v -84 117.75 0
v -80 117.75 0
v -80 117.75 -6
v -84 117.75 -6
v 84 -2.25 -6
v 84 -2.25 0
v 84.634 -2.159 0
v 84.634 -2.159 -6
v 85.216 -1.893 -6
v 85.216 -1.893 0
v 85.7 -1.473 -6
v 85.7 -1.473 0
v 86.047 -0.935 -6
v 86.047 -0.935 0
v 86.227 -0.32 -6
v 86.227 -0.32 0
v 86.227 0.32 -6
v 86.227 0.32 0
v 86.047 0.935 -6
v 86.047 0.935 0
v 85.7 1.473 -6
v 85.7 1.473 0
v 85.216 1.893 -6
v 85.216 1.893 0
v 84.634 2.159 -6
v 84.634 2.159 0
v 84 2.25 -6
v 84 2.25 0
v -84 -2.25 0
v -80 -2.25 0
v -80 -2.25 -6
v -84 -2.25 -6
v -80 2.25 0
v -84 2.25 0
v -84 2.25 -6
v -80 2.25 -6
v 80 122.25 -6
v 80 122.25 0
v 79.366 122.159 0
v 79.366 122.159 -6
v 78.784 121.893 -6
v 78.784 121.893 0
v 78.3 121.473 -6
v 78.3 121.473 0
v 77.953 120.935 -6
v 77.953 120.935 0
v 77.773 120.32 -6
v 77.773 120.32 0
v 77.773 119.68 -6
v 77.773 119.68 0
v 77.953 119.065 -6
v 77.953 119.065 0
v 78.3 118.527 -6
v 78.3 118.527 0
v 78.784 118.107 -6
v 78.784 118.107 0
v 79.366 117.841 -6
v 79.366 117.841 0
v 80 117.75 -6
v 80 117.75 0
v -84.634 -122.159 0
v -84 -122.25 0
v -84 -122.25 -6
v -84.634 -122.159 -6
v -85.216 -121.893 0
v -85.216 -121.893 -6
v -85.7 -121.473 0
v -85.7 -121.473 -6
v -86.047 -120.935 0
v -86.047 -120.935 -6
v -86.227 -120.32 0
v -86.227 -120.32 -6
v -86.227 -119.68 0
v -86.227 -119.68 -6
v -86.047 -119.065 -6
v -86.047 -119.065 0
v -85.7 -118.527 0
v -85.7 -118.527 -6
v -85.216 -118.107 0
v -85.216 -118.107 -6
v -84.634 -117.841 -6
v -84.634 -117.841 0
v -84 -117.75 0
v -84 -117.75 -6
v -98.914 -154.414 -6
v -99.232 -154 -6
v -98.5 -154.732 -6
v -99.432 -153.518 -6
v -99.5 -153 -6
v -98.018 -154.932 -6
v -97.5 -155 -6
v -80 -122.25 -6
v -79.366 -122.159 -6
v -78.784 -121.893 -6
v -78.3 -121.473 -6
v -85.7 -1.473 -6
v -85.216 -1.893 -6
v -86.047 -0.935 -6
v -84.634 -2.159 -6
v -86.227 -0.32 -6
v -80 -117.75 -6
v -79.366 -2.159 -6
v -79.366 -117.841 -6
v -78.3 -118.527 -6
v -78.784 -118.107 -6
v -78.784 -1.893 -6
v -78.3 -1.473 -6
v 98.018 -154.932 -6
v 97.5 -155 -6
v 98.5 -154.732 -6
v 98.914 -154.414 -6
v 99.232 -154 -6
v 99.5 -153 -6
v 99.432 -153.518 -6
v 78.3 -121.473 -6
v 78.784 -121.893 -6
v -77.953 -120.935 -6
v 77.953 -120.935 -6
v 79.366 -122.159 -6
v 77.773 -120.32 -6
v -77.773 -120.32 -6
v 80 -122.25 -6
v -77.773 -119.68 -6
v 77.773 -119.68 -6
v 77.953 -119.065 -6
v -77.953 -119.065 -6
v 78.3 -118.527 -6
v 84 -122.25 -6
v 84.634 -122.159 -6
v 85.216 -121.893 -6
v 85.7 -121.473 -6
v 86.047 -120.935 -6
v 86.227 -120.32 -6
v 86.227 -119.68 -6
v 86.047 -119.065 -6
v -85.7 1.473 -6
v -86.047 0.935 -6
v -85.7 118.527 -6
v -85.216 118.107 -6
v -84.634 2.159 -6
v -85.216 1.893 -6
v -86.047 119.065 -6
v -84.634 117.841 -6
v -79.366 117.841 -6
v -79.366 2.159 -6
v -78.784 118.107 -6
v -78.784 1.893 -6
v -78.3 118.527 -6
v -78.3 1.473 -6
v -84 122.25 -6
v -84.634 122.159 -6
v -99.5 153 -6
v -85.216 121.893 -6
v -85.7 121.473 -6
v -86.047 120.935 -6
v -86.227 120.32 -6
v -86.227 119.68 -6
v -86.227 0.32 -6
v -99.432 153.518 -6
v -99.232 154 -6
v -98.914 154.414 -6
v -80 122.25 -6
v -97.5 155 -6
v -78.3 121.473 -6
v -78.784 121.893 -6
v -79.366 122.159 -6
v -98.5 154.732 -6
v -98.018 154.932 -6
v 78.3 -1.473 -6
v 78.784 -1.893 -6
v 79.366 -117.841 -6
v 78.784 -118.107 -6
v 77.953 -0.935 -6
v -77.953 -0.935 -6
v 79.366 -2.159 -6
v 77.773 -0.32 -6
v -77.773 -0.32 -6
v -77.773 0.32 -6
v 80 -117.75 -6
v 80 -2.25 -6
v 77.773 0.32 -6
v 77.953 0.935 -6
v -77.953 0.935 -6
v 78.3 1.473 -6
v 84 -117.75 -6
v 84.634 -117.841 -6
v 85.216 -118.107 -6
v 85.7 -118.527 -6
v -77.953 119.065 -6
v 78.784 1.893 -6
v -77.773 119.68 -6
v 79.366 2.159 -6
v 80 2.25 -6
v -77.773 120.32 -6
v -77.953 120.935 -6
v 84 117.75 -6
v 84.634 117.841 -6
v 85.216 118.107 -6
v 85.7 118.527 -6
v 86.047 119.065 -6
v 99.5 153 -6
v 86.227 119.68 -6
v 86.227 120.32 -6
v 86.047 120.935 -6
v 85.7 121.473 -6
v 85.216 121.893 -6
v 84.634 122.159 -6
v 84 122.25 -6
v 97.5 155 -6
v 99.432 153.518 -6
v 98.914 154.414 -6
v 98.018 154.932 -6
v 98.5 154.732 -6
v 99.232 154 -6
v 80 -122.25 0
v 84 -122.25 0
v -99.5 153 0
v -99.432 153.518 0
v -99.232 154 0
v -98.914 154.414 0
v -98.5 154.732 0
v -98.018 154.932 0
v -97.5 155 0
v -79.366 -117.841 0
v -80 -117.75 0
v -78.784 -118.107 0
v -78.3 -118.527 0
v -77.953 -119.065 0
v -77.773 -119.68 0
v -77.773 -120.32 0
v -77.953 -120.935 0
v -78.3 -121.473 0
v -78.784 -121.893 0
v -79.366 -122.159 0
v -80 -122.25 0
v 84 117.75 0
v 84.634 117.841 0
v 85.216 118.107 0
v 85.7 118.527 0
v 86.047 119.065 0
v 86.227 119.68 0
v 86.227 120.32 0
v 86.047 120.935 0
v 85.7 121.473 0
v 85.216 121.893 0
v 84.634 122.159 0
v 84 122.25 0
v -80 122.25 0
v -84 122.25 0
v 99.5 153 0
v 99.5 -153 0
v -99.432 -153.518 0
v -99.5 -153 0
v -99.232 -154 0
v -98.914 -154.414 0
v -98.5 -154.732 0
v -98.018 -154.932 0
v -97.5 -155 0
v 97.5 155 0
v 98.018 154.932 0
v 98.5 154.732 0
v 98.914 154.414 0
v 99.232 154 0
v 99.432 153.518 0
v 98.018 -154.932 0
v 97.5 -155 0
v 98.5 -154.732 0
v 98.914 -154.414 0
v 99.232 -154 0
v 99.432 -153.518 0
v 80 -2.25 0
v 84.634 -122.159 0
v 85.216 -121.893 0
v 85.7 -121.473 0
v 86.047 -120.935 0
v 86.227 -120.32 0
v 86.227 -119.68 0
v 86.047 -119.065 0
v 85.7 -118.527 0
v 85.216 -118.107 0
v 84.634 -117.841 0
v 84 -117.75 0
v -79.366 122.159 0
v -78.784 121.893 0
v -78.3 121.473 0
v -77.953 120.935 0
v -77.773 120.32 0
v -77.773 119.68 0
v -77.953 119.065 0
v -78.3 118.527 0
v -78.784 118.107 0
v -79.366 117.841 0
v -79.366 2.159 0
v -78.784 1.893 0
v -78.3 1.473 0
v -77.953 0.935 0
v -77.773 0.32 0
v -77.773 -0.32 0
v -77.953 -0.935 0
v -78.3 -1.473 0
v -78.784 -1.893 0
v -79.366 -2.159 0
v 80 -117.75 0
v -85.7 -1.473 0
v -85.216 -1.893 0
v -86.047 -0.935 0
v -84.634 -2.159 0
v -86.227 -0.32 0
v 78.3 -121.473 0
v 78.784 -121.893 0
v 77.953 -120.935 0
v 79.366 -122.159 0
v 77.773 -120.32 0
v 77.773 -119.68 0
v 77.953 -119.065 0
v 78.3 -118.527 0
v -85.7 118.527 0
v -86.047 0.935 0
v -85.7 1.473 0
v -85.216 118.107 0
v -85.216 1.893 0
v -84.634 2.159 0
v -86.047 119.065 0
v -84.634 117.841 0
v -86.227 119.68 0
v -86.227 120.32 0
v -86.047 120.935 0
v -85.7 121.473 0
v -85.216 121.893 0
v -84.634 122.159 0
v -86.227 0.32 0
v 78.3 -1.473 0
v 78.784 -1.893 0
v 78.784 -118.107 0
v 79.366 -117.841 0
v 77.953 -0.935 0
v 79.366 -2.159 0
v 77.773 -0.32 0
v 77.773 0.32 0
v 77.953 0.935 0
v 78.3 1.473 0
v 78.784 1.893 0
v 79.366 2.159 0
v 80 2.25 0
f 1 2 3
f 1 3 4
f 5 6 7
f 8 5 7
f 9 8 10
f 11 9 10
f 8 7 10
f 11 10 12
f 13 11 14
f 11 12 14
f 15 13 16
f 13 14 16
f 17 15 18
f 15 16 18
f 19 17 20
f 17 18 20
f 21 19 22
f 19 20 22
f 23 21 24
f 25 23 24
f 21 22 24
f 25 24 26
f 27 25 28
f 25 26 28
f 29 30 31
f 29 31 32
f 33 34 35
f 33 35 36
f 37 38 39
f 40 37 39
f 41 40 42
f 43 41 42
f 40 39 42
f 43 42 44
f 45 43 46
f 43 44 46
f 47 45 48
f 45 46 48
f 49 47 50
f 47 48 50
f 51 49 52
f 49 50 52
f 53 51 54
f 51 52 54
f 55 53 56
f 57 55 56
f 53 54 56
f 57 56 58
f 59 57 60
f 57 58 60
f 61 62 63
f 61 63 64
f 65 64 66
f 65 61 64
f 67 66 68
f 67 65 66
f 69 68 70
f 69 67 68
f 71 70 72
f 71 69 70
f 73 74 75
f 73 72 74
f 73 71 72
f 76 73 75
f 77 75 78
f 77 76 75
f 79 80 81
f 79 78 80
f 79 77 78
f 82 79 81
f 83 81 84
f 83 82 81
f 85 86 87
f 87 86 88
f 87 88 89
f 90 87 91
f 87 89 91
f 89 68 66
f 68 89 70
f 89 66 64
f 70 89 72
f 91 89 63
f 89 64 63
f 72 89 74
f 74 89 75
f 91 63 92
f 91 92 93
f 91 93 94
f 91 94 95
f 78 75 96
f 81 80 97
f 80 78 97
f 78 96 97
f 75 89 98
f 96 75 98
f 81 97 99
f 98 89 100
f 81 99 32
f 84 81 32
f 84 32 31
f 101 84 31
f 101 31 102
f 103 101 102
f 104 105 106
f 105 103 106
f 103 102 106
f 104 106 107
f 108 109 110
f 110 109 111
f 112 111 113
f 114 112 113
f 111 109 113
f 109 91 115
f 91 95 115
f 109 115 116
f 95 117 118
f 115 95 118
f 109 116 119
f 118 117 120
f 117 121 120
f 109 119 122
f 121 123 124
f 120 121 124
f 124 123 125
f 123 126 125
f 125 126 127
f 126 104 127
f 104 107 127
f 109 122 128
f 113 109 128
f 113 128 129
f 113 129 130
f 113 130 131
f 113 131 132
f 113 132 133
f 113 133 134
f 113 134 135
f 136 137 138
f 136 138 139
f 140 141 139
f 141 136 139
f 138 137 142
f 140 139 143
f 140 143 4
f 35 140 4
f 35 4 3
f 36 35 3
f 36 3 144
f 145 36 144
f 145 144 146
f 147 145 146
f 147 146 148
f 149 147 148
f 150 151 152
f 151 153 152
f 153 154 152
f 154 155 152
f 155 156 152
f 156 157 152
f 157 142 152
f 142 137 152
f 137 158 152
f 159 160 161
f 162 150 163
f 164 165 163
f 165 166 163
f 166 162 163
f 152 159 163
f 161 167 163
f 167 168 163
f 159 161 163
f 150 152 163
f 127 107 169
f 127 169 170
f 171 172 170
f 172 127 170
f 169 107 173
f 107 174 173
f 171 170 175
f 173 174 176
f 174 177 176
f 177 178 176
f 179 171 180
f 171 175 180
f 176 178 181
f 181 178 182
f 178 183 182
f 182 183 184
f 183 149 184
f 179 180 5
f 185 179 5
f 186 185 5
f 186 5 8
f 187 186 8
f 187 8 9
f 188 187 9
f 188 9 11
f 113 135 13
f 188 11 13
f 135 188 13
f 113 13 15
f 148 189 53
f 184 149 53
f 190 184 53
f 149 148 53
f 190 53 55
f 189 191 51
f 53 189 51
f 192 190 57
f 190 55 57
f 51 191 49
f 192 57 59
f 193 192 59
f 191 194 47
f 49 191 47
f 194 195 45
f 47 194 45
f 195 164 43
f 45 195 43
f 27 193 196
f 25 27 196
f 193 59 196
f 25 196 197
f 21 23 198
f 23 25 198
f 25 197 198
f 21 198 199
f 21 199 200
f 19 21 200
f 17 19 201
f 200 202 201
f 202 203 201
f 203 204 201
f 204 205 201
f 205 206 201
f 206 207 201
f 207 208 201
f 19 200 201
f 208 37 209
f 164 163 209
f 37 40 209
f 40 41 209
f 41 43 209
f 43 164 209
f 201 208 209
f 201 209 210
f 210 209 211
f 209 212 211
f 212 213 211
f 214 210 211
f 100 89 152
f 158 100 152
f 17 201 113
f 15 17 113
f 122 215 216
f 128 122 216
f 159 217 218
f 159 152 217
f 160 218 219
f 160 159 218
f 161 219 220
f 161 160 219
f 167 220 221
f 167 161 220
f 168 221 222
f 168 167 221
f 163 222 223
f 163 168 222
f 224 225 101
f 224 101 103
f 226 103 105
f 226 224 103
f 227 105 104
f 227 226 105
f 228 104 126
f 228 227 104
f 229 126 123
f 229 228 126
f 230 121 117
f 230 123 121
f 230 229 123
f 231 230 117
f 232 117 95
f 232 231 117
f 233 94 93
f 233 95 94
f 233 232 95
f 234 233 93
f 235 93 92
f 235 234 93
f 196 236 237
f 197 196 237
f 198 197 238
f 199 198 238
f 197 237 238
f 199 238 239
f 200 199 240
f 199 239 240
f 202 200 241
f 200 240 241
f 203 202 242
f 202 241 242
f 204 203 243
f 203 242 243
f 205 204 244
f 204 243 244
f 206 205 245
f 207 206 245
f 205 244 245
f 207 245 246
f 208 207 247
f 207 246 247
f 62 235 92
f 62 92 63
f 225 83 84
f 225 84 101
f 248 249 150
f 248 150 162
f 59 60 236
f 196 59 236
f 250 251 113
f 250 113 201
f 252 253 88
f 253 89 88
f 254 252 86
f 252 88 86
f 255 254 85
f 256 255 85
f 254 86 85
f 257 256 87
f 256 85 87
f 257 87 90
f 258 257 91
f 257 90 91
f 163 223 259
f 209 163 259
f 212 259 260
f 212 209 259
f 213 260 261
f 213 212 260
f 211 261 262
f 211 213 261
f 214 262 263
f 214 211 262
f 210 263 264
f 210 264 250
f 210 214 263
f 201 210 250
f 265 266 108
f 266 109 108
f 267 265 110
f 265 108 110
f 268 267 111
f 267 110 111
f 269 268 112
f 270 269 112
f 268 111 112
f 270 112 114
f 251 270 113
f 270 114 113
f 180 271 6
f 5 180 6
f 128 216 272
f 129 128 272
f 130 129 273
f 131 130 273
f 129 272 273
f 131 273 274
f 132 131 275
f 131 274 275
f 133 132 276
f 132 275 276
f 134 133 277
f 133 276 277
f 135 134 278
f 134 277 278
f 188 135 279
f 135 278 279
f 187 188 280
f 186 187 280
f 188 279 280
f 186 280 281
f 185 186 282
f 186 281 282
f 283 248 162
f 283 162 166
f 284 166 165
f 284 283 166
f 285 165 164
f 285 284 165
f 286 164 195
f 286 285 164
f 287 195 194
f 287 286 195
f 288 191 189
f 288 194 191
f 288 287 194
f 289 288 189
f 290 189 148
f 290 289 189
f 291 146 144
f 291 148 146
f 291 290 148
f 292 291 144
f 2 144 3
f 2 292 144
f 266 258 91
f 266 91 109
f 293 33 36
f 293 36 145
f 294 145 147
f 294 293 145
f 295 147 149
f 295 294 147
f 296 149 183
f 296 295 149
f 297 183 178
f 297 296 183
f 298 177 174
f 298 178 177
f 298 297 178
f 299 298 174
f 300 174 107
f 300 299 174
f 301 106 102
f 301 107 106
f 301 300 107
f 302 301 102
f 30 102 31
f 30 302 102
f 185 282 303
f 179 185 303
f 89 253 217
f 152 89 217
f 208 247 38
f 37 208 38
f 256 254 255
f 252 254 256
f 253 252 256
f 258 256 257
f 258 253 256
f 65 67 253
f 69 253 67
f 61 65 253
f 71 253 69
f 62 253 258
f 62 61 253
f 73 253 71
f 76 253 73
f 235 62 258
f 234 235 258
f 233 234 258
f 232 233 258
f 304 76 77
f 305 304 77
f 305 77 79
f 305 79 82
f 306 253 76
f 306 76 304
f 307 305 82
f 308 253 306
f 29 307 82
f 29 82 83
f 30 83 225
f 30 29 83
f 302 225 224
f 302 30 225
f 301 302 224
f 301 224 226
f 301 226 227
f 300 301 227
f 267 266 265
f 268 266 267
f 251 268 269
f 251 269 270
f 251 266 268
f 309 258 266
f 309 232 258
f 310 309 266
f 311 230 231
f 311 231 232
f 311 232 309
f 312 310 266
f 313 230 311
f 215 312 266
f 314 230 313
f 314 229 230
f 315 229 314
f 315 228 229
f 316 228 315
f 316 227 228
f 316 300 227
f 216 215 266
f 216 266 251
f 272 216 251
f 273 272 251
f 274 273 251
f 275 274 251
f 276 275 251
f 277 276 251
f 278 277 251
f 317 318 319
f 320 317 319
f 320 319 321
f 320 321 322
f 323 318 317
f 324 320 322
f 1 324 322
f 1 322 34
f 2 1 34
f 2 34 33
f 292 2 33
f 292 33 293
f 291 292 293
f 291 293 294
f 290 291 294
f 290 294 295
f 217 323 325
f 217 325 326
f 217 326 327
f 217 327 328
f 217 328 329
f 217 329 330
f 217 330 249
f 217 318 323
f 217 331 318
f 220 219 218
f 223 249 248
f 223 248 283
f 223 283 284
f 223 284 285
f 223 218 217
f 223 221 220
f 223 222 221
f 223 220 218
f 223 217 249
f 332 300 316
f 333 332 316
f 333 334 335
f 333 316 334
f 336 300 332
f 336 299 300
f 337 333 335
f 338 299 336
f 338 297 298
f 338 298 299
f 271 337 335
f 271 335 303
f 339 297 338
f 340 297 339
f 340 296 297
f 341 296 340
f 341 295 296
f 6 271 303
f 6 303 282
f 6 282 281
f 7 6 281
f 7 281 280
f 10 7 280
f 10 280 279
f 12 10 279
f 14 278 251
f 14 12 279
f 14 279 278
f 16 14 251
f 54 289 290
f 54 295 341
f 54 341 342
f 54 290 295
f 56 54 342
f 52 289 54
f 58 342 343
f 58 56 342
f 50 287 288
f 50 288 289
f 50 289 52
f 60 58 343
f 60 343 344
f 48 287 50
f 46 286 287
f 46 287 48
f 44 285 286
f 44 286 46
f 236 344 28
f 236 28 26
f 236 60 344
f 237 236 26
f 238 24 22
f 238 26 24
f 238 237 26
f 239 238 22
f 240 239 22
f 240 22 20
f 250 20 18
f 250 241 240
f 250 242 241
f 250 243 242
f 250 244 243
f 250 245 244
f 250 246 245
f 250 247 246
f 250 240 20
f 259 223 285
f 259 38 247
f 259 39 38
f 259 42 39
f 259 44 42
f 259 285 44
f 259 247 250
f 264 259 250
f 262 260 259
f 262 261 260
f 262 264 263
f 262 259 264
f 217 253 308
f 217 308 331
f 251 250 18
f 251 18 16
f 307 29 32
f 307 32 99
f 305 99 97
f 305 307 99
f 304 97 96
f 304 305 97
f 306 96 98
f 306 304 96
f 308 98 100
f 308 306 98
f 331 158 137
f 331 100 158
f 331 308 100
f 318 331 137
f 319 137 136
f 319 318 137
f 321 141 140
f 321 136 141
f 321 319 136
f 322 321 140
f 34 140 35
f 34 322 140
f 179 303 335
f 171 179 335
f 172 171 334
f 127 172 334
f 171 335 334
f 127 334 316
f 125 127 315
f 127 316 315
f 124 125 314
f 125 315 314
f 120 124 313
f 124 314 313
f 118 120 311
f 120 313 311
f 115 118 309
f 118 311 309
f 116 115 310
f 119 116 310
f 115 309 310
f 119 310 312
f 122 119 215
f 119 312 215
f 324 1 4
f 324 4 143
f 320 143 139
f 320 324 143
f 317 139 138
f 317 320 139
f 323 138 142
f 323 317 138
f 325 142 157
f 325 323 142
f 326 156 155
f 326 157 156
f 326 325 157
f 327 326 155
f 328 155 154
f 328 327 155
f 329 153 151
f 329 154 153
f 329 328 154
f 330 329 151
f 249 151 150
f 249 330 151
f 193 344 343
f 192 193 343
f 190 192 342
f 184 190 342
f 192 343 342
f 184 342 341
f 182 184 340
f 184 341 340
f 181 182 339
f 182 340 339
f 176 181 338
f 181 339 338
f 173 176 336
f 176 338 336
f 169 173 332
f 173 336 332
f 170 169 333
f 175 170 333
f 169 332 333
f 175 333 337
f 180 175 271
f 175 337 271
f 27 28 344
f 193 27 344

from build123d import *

# Parameters (mm, degrees)
CROQUIS1_W             = 199
CROQUIS1_H             = 310
BRIDA_BASE1_DEPTH      = 6
CORTAR_EXTRUIR1_DEPTH  = 10
MATRIZL1_COUNT         = 2
MATRIZL1_PITCH         = 120
MATRIZL1_COL_COUNT     = 2
MATRIZL1_COL_PITCH     = 120
SIMETR_A1_COPY_1_DEPTH = 10
SIMETR_A1_COPY_2_DEPTH = 10
REDONDEO1_R            = 2


# Sheet-metal steps are written as plain solids
with BuildPart() as part:
    # Croquis1 → Brida base1 (new body)
    with BuildSketch(Plane.XY):
        Rectangle(CROQUIS1_W, CROQUIS1_H)
    extrude(amount=-BRIDA_BASE1_DEPTH)

    # Croquis4 → Cortar-Extruir1 (cut)
    with BuildSketch(Plane.XY):
        with BuildLine():
            Line((-84, 2.25), (-80, 2.25))
            ThreePointArc((-80, 2.25), (-77.75, 0), (-80, -2.25))
            Line((-80, -2.25), (-84, -2.25))
            ThreePointArc((-84, -2.25), (-86.25, 0), (-84, 2.25))
        make_face()
    cortar_extruir1 = extrude(amount=-CORTAR_EXTRUIR1_DEPTH, mode=Mode.SUBTRACT)

    # MatrizL1: Cortar-Extruir1 ×2
    with Locations(*[(0, i * MATRIZL1_PITCH, 0) for i in range(1, MATRIZL1_COUNT)]):
        add(cortar_extruir1, mode=Mode.SUBTRACT)

    # MatrizL1 col: Cortar-Extruir1 ×2
    with Locations(*[(0, -i * MATRIZL1_COL_PITCH, 0) for i in range(1, MATRIZL1_COL_COUNT)]):
        add(cortar_extruir1, mode=Mode.SUBTRACT)

    # Simetría1: Cortar-Extruir1 across plane
    add(cortar_extruir1.mirror(Plane(origin=(0, 0, 0), x_dir=(0, 0, 1), z_dir=(1, 0, 0))), mode=Mode.SUBTRACT)

    # Simetría1 copy 1 sketch → Simetría1 copy 1 (cut)
    with BuildSketch(Plane(origin=(0, 120, 0), x_dir=(-1, 0, 0), z_dir=(0, 0, 1))):
        with BuildLine():
            Line((-84, -2.25), (-80, -2.25))
            ThreePointArc((-80, -2.25), (-77.75, 0), (-80, 2.25))
            Line((-80, 2.25), (-84, 2.25))
            ThreePointArc((-84, 2.25), (-86.25, 0), (-84, -2.25))
        make_face()
    extrude(amount=-SIMETR_A1_COPY_1_DEPTH, mode=Mode.SUBTRACT)

    # Simetría1 copy 2 sketch → Simetría1 copy 2 (cut)
    with BuildSketch(Plane(origin=(0, -120, 0), x_dir=(-1, 0, 0), z_dir=(0, 0, 1))):
        with BuildLine():
            Line((-84, -2.25), (-80, -2.25))
            ThreePointArc((-80, -2.25), (-77.75, 0), (-80, 2.25))
            Line((-80, 2.25), (-84, 2.25))
            ThreePointArc((-84, 2.25), (-86.25, 0), (-84, -2.25))
        make_face()
    extrude(amount=-SIMETR_A1_COPY_2_DEPTH, mode=Mode.SUBTRACT)

    # Redondeo1
    redondeo1_edges = [part.edges().sort_by_distance(p)[0] for p in [
        (-99.5, 155, -3),
        (99.5, 155, -3),
        (99.5, -155, -3),
        (-99.5, -155, -3),
    ]]
    fillet(redondeo1_edges, radius=REDONDEO1_R)


solid = part.part
